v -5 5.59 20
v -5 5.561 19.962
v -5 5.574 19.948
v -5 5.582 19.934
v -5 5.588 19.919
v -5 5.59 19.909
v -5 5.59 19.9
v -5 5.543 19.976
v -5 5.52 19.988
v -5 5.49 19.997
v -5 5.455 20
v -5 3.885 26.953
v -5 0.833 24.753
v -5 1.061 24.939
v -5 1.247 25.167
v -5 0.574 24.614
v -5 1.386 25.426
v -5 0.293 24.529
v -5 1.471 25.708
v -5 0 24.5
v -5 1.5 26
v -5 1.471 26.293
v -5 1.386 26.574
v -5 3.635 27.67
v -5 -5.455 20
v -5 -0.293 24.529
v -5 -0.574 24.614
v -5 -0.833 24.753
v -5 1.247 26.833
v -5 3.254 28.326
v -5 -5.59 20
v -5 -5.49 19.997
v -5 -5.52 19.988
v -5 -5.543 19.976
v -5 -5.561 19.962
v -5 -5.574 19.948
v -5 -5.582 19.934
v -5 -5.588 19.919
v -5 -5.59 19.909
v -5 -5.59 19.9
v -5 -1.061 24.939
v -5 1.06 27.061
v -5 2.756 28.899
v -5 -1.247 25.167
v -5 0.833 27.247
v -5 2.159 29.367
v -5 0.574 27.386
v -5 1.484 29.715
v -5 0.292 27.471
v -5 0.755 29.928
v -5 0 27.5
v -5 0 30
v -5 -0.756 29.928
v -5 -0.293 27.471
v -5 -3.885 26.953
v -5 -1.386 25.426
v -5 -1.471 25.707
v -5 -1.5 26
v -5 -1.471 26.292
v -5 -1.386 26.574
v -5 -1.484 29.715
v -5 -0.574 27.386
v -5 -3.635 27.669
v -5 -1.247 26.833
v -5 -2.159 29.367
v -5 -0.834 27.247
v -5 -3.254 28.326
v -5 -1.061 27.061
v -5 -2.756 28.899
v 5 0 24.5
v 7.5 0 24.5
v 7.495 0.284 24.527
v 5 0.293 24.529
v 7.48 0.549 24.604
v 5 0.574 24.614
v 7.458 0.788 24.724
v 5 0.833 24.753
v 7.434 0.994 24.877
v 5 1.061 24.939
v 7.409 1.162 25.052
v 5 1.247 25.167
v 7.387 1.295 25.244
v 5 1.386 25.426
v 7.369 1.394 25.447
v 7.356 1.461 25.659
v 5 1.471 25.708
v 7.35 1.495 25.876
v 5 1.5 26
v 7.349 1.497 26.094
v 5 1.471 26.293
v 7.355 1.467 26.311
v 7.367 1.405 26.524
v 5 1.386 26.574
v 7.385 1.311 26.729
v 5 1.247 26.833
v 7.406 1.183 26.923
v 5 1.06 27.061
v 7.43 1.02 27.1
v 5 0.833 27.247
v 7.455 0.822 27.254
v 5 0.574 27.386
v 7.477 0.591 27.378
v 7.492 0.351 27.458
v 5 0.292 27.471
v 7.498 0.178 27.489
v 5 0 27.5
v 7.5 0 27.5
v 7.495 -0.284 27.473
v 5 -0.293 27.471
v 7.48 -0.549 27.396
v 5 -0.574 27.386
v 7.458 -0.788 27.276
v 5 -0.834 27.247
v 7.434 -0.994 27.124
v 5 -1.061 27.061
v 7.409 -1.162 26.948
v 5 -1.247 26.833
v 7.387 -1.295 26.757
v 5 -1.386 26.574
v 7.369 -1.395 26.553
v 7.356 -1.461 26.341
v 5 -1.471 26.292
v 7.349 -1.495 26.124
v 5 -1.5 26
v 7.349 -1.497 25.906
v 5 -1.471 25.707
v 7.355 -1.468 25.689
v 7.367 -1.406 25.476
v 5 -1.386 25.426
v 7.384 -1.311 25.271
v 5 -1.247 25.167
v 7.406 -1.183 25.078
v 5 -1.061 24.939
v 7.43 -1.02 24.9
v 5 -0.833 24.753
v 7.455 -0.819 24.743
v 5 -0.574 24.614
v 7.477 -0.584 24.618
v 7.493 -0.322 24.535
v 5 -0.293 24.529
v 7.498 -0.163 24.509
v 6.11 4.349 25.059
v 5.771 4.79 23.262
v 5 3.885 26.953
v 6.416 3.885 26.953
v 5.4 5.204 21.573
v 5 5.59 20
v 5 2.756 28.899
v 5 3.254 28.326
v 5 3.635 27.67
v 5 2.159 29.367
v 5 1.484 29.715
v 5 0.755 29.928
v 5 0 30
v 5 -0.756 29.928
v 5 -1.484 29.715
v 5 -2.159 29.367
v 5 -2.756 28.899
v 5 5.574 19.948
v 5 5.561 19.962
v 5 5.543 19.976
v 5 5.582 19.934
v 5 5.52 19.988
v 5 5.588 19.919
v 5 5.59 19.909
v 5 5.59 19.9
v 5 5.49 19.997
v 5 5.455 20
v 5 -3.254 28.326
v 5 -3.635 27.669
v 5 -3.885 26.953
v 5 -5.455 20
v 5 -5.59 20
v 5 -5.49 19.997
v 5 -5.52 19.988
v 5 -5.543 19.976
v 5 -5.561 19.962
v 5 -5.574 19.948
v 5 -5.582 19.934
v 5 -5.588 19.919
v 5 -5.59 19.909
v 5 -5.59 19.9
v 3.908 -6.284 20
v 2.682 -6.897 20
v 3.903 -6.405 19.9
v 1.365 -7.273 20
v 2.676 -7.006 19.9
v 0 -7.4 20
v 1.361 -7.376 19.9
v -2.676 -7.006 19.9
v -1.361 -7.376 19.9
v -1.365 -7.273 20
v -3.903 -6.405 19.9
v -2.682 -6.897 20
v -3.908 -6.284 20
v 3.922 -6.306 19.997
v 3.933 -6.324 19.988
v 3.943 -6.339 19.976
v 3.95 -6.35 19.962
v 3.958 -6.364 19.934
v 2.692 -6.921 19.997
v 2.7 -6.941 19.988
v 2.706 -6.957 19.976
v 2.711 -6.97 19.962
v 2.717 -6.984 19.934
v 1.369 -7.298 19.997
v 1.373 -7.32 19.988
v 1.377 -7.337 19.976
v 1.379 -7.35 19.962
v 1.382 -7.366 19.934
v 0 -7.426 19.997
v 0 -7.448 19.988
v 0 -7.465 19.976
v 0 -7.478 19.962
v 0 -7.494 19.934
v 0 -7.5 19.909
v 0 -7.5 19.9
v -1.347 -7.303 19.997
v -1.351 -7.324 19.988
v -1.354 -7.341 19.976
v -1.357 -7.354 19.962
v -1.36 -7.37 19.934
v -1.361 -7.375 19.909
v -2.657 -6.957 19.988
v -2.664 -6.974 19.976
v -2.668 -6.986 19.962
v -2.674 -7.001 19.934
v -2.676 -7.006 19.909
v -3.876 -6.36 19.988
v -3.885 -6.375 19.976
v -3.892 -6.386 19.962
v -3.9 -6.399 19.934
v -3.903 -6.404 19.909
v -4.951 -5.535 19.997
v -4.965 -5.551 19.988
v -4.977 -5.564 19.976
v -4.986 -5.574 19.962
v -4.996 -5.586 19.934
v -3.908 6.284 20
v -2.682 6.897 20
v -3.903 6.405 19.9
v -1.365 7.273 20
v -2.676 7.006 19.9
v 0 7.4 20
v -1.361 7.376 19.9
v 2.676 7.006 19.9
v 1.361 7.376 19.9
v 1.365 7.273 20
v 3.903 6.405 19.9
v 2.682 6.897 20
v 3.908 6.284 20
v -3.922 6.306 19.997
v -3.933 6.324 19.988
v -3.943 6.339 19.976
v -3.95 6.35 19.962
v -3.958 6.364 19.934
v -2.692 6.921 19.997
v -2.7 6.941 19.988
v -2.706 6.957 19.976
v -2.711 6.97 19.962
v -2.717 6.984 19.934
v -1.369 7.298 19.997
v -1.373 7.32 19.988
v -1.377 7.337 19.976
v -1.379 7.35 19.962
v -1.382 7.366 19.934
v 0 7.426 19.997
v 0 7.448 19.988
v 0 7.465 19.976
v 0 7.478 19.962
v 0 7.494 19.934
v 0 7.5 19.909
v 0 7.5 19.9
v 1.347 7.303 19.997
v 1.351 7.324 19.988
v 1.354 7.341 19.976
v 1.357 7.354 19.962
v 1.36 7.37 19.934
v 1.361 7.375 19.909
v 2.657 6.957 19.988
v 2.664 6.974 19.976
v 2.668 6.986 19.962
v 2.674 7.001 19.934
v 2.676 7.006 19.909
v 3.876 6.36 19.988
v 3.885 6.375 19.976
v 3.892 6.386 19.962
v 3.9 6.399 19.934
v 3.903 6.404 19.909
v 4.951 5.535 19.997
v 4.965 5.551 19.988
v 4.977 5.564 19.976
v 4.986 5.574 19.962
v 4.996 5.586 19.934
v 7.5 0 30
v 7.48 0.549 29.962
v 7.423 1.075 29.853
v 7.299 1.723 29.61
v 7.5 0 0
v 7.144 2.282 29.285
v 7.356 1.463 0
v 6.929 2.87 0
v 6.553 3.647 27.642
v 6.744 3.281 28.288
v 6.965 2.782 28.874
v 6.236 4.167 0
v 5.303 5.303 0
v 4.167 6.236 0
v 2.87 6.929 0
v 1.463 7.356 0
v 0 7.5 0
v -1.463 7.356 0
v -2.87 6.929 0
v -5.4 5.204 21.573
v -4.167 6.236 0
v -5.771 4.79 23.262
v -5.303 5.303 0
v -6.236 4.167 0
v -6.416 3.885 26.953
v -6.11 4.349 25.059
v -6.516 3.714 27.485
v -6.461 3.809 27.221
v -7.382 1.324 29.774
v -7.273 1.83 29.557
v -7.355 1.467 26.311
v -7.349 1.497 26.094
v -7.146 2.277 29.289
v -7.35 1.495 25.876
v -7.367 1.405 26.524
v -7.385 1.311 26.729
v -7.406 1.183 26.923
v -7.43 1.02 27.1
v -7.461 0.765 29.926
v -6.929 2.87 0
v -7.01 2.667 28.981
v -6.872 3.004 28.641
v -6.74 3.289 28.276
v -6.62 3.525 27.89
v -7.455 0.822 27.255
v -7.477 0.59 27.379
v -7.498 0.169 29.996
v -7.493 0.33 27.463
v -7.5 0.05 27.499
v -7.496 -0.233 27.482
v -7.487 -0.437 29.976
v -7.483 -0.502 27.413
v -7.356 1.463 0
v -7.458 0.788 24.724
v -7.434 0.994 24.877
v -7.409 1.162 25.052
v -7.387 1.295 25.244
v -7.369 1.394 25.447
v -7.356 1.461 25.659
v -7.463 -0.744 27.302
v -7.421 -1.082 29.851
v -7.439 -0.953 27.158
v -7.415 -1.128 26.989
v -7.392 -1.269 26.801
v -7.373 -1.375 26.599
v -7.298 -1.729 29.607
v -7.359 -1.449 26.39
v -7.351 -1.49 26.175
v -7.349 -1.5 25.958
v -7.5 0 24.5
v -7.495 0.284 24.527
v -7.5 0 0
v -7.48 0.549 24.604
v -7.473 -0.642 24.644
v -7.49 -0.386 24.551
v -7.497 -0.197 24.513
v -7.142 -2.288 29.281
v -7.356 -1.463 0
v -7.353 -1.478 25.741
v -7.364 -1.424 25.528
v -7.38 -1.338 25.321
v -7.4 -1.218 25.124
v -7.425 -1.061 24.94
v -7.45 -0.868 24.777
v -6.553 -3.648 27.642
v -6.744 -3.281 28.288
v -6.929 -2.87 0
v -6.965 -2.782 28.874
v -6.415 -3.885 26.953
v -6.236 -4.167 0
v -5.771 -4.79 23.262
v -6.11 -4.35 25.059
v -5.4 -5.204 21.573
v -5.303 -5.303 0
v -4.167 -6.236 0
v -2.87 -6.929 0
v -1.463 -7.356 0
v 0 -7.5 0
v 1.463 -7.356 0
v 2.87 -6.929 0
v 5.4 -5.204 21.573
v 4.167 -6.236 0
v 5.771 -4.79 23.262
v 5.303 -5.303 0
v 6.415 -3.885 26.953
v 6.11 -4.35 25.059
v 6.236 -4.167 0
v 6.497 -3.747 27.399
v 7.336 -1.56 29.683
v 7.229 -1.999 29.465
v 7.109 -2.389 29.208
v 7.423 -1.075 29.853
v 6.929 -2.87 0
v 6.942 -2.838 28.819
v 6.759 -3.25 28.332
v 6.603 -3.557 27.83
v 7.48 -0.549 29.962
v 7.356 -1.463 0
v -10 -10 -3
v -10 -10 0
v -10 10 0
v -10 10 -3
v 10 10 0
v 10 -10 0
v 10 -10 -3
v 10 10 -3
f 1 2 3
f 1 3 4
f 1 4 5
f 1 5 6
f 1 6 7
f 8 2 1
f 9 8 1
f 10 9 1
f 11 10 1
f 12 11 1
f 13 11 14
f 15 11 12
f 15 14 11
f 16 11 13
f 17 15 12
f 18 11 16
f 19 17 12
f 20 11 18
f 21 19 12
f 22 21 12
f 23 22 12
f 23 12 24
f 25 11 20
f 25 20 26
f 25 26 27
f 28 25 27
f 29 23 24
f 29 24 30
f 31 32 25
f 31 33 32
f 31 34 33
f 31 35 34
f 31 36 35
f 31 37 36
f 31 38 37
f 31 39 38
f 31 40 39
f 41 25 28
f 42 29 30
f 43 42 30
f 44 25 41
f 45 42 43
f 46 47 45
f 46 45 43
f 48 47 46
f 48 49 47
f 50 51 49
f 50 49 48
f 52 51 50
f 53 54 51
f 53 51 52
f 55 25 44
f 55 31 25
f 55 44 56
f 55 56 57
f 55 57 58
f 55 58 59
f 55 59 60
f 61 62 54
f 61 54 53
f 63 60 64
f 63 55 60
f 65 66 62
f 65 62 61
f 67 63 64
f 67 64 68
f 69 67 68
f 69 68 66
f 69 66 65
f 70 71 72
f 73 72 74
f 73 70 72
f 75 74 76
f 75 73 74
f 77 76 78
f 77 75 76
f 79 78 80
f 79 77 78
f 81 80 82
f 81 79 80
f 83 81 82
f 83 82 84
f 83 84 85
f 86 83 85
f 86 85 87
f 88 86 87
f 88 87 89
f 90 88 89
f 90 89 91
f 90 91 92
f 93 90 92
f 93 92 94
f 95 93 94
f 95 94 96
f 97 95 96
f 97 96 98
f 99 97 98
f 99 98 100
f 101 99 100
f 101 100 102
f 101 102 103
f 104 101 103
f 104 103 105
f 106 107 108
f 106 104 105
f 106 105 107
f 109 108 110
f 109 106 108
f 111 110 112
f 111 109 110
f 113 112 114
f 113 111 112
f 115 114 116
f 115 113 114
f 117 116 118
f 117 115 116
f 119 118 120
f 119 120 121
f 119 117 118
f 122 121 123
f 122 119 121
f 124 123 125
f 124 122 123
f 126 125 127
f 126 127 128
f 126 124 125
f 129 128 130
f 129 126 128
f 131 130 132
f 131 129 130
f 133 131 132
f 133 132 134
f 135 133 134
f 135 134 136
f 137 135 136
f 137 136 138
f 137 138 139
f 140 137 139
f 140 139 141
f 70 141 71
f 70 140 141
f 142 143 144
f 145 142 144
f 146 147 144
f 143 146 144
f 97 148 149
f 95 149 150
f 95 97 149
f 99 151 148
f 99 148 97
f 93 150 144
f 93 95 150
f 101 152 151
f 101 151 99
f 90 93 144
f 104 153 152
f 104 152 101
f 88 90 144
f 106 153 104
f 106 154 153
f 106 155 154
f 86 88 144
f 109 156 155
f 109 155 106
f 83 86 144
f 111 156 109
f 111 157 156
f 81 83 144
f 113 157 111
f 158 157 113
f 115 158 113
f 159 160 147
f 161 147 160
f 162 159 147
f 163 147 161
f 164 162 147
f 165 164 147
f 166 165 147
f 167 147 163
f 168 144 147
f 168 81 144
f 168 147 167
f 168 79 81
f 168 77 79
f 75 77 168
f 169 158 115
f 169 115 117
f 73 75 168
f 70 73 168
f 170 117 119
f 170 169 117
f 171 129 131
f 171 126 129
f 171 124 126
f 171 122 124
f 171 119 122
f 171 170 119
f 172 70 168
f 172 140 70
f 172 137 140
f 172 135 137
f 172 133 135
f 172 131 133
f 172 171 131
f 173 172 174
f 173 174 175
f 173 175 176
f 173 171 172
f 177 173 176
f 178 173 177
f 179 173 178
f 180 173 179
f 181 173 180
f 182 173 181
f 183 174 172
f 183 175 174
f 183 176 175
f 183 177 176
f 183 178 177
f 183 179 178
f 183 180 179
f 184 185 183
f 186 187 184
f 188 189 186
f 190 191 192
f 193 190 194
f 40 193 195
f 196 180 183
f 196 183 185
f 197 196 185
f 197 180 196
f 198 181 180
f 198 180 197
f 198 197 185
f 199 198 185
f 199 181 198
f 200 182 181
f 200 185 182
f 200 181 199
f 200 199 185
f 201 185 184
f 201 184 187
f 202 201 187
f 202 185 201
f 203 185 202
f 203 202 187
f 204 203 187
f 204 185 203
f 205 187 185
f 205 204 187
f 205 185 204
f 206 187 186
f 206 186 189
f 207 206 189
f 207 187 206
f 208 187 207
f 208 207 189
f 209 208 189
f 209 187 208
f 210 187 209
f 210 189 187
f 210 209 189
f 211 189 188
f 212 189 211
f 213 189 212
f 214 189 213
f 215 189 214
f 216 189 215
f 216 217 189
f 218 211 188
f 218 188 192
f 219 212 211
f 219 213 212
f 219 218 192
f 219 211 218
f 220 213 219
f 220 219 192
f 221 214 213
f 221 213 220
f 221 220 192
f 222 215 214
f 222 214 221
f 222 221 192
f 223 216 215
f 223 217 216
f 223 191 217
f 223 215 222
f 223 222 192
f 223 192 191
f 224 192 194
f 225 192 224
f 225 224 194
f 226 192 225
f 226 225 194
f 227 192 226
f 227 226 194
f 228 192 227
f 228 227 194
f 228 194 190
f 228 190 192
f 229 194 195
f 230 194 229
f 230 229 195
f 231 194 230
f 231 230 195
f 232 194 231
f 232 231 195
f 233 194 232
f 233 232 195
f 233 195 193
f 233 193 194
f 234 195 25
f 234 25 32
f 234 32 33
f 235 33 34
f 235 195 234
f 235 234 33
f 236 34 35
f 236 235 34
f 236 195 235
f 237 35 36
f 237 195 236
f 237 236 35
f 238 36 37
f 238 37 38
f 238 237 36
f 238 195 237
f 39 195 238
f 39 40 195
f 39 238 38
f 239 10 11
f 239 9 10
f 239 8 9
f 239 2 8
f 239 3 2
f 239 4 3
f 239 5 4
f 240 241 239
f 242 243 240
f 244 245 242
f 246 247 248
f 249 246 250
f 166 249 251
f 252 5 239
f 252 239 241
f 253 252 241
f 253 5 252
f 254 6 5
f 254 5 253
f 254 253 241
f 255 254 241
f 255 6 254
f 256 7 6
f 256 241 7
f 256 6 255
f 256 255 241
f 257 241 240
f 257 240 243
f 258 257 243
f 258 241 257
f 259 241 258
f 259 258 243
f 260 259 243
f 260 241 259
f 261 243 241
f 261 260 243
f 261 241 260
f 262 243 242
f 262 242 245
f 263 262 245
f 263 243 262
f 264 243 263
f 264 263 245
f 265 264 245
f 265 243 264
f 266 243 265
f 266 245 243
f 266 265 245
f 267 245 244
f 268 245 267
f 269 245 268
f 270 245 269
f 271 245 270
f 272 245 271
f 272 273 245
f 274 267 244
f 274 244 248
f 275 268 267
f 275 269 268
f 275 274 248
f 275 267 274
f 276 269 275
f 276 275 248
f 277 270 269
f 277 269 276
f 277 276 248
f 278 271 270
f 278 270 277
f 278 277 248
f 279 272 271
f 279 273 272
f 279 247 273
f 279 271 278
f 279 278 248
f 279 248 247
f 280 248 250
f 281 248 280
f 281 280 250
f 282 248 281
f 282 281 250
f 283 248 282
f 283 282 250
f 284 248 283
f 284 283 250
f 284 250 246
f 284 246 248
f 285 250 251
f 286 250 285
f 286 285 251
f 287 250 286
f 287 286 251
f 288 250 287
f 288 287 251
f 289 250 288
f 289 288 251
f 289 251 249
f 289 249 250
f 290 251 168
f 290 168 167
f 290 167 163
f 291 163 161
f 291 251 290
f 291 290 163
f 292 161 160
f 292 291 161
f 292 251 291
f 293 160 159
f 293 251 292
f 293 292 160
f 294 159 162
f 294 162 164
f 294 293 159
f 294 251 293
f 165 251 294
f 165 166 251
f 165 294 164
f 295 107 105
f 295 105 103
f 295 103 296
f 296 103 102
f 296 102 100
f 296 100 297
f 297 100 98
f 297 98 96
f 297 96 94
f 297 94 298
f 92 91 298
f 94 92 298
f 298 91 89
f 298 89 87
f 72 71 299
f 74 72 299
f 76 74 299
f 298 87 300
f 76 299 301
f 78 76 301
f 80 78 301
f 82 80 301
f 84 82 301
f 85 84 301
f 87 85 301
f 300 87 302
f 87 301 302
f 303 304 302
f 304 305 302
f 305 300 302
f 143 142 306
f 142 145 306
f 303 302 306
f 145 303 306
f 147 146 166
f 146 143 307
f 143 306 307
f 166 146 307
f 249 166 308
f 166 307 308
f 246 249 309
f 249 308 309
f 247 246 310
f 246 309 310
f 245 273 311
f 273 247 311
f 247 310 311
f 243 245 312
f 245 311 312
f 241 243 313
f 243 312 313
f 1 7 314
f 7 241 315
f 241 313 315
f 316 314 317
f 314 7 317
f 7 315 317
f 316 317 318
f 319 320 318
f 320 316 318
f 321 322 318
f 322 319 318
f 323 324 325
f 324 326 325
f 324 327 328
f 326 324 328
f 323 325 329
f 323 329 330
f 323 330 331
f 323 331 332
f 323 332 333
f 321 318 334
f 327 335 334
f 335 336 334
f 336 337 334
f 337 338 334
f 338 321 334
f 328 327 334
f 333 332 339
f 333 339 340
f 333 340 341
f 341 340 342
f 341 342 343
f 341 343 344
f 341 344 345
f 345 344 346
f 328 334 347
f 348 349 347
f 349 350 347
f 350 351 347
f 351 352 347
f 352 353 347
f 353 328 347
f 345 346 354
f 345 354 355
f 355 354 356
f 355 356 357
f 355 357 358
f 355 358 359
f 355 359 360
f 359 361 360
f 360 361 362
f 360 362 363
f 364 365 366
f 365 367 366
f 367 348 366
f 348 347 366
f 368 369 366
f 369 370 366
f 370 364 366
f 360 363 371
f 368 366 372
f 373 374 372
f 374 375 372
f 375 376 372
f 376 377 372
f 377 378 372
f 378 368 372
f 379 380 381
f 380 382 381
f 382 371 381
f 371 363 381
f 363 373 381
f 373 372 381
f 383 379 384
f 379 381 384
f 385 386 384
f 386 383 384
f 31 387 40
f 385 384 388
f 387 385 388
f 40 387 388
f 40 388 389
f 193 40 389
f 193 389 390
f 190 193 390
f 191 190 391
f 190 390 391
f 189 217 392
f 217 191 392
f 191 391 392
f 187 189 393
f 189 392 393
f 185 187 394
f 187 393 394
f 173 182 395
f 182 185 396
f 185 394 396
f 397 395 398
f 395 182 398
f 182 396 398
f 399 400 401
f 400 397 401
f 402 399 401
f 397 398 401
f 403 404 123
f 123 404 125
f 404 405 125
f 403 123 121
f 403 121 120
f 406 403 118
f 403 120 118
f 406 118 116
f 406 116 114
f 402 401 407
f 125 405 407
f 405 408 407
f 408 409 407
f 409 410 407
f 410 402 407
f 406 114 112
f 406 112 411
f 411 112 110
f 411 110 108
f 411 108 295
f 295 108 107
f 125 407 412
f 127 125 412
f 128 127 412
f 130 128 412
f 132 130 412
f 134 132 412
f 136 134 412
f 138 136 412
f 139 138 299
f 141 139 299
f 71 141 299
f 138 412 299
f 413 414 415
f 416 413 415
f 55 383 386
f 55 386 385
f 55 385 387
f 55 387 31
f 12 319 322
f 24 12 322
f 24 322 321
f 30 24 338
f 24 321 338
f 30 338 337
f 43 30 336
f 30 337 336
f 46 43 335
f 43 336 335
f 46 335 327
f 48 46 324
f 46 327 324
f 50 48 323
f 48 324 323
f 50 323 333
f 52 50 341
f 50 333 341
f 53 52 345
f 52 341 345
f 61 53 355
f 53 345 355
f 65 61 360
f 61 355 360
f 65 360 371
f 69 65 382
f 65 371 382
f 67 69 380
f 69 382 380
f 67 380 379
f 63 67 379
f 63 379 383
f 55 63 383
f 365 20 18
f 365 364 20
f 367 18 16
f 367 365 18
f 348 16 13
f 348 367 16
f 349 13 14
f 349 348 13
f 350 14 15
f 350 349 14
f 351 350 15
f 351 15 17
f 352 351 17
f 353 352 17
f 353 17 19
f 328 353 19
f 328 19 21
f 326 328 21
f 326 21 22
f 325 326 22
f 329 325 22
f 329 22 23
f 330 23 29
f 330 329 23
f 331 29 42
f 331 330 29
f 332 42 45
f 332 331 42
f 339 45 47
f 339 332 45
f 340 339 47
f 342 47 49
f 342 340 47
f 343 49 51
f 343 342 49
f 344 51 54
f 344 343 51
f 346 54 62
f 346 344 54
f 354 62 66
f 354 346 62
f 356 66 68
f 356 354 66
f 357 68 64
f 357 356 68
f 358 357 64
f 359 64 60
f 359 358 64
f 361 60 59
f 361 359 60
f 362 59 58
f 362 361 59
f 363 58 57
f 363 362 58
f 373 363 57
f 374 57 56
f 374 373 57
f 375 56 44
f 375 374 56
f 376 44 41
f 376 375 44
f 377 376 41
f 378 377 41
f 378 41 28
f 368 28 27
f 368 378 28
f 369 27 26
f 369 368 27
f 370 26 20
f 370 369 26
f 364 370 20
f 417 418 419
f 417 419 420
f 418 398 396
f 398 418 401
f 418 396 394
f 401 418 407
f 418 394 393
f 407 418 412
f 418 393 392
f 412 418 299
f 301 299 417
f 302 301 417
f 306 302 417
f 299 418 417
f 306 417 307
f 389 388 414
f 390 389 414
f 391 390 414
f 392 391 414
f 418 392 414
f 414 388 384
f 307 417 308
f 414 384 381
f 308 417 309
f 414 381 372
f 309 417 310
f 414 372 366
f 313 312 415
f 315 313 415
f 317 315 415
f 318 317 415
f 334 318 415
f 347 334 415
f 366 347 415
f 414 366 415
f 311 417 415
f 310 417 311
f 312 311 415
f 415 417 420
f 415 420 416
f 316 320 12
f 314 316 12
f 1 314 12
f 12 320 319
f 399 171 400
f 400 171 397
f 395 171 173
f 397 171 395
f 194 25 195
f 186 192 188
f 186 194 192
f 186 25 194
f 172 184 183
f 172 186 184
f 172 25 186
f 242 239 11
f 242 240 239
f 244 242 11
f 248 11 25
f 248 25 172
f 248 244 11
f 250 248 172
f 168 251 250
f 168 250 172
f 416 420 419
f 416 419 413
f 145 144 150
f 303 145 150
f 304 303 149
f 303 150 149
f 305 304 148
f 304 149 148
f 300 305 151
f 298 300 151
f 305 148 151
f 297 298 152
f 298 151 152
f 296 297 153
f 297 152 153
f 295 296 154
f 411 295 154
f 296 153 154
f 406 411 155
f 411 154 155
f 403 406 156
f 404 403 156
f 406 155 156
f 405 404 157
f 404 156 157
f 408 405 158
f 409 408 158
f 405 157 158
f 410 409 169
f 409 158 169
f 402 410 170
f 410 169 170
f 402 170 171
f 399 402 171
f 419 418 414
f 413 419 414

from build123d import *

# Parameters (mm, degrees)
SKETCH1_R               = 7.5
BOSS_EXTRUDE1_DEPTH     = 30
SKETCH3_W               = 10
SKETCH3_H               = 16
CUT_EXTRUDE2_DEPTH      = 10
CUT_EXTRUDE3_DEPTH      = 32.819805153
CUT_EXTRUDE3_DEPTH_BACK = 32.819805153
CUT_EXTRUDE4_DEPTH      = 32.819805295
CUT_EXTRUDE4_DEPTH_BACK = 32.819805295
SKETCH5_R               = 1.5
FILLET1_R               = 0.1
SKETCH6_W               = 20
SKETCH6_H               = 20
BOSS_EXTRUDE2_DEPTH     = 3


with BuildPart() as part:
    # Sketch1 → Boss-Extrude1 (new body)
    with BuildSketch(Plane.XY):
        Circle(SKETCH1_R)
    extrude(amount=BOSS_EXTRUDE1_DEPTH)

    # Sketch3 → Cut-Extrude2 (cut)
    with BuildSketch(Plane.XY.offset(30)):
        Rectangle(SKETCH3_W, SKETCH3_H)
    extrude(amount=-CUT_EXTRUDE2_DEPTH, mode=Mode.SUBTRACT)

    # Sketch4 → Cut-Extrude3 (cut, two sides: drawn at the far end of the back side and taken through both)
    with BuildSketch(Plane(origin=(0, 0, 0), x_dir=(0, 0, -1), z_dir=(1, 0, 0)).offset(-CUT_EXTRUDE3_DEPTH_BACK)):
        with BuildLine():
            Line((-20, 67.5), (-20, 7.5))
            Line((-20, 7.5), (-20, 5.590169944))
            Line((-20, 5.590169944), (-26.952923855, 3.884664175))
            ThreePointArc((-26.952923855, 3.884664175), (-29.999999999, -0.000262165), (-26.952744721, -3.885047998))
            Line((-26.952744721, -3.885047998), (-20, -5.590169944))
            Line((-20, -5.590169944), (-20, -7.5))
            Line((-20, -7.5), (-20, -67.5))
            Line((-20, -67.5), (-140, -67.5))
            Line((-140, -67.5), (-140, 67.5))
            Line((-140, 67.5), (-20, 67.5))
        make_face()
    extrude(amount=CUT_EXTRUDE3_DEPTH + CUT_EXTRUDE3_DEPTH_BACK, mode=Mode.SUBTRACT)

    # Sketch5 → Cut-Extrude4 (cut, two sides: drawn at the far end of the back side and taken through both)
    with BuildSketch(Plane(origin=(0, 0, 0), x_dir=(0, 0, -1), z_dir=(1, 0, 0)).offset(-CUT_EXTRUDE4_DEPTH_BACK)):
        with Locations(Location((-26, -0.000169944, 0), (0, 0, 0.006491373))):
            Circle(SKETCH5_R)
    extrude(amount=CUT_EXTRUDE4_DEPTH + CUT_EXTRUDE4_DEPTH_BACK, mode=Mode.SUBTRACT)

    # Fillet1
    # the kernel refuses this fillet: 0.1 mm, written as the material it takes off along each edge
    with BuildSketch(Plane(origin=(0, 0, 20), x_dir=(0.6911452834399253, -0.7227158481580055, 0), z_dir=(0.7227158481580055, 0.6911452834399253, 0))) as fillet1_piece_1_section:
        with BuildLine():
            CenterArc((7.5 - FILLET1_R, FILLET1_R), FILLET1_R, 270, 90)
            Line((7.5 - FILLET1_R, 0), (7.5, 0))
            Line((7.5, 0), (7.5, FILLET1_R))
        make_face()
    fillet1_piece_1 = revolve(axis=Axis((0, 0, 20), (0, 0, -1)), revolution_arc=87.441672972, mode=Mode.PRIVATE)
    fillet1_piece_1 = split(fillet1_piece_1, bisect_by=Plane(origin=(5, -5.569278589, 19.983070115), z_dir=(-1, 0, 0)), keep=Keep.TOP, mode=Mode.PRIVATE)
    fillet1_piece_1 = split(fillet1_piece_1, bisect_by=Plane(origin=(-5, -5.569278589, 19.983070115), z_dir=(1, 0, 0)), keep=Keep.TOP, mode=Mode.PRIVATE)
    add(fillet1_piece_1, mode=Mode.SUBTRACT)
    with BuildSketch(Plane(origin=(0, 0, 20), x_dir=(-0.6911452834399255, 0.7227158481580054, 0), z_dir=(-0.7227158481580054, -0.6911452834399255, 0))) as fillet1_piece_2_section:
        with BuildLine():
            CenterArc((7.5 - FILLET1_R, FILLET1_R), FILLET1_R, 270, 90)
            Line((7.5 - FILLET1_R, 0), (7.5, 0))
            Line((7.5, 0), (7.5, FILLET1_R))
        make_face()
    fillet1_piece_2 = revolve(axis=Axis((0, 0, 20), (0, 0, -1)), revolution_arc=87.441672972, mode=Mode.PRIVATE)
    fillet1_piece_2 = split(fillet1_piece_2, bisect_by=Plane(origin=(5, 5.569279486, 19.983069507), z_dir=(-1, 0, 0)), keep=Keep.TOP, mode=Mode.PRIVATE)
    fillet1_piece_2 = split(fillet1_piece_2, bisect_by=Plane(origin=(-5, 5.569279486, 19.983069507), z_dir=(1, 0, 0)), keep=Keep.TOP, mode=Mode.PRIVATE)
    add(fillet1_piece_2, mode=Mode.SUBTRACT)

    # Sketch6 → Boss-Extrude2 (add)
    with BuildSketch(Plane(origin=(0, 0, 0), x_dir=(-1, 0, 0), z_dir=(0, 0, -1))):
        Rectangle(SKETCH6_W, SKETCH6_H)
    extrude(amount=BOSS_EXTRUDE2_DEPTH)


solid = part.part
